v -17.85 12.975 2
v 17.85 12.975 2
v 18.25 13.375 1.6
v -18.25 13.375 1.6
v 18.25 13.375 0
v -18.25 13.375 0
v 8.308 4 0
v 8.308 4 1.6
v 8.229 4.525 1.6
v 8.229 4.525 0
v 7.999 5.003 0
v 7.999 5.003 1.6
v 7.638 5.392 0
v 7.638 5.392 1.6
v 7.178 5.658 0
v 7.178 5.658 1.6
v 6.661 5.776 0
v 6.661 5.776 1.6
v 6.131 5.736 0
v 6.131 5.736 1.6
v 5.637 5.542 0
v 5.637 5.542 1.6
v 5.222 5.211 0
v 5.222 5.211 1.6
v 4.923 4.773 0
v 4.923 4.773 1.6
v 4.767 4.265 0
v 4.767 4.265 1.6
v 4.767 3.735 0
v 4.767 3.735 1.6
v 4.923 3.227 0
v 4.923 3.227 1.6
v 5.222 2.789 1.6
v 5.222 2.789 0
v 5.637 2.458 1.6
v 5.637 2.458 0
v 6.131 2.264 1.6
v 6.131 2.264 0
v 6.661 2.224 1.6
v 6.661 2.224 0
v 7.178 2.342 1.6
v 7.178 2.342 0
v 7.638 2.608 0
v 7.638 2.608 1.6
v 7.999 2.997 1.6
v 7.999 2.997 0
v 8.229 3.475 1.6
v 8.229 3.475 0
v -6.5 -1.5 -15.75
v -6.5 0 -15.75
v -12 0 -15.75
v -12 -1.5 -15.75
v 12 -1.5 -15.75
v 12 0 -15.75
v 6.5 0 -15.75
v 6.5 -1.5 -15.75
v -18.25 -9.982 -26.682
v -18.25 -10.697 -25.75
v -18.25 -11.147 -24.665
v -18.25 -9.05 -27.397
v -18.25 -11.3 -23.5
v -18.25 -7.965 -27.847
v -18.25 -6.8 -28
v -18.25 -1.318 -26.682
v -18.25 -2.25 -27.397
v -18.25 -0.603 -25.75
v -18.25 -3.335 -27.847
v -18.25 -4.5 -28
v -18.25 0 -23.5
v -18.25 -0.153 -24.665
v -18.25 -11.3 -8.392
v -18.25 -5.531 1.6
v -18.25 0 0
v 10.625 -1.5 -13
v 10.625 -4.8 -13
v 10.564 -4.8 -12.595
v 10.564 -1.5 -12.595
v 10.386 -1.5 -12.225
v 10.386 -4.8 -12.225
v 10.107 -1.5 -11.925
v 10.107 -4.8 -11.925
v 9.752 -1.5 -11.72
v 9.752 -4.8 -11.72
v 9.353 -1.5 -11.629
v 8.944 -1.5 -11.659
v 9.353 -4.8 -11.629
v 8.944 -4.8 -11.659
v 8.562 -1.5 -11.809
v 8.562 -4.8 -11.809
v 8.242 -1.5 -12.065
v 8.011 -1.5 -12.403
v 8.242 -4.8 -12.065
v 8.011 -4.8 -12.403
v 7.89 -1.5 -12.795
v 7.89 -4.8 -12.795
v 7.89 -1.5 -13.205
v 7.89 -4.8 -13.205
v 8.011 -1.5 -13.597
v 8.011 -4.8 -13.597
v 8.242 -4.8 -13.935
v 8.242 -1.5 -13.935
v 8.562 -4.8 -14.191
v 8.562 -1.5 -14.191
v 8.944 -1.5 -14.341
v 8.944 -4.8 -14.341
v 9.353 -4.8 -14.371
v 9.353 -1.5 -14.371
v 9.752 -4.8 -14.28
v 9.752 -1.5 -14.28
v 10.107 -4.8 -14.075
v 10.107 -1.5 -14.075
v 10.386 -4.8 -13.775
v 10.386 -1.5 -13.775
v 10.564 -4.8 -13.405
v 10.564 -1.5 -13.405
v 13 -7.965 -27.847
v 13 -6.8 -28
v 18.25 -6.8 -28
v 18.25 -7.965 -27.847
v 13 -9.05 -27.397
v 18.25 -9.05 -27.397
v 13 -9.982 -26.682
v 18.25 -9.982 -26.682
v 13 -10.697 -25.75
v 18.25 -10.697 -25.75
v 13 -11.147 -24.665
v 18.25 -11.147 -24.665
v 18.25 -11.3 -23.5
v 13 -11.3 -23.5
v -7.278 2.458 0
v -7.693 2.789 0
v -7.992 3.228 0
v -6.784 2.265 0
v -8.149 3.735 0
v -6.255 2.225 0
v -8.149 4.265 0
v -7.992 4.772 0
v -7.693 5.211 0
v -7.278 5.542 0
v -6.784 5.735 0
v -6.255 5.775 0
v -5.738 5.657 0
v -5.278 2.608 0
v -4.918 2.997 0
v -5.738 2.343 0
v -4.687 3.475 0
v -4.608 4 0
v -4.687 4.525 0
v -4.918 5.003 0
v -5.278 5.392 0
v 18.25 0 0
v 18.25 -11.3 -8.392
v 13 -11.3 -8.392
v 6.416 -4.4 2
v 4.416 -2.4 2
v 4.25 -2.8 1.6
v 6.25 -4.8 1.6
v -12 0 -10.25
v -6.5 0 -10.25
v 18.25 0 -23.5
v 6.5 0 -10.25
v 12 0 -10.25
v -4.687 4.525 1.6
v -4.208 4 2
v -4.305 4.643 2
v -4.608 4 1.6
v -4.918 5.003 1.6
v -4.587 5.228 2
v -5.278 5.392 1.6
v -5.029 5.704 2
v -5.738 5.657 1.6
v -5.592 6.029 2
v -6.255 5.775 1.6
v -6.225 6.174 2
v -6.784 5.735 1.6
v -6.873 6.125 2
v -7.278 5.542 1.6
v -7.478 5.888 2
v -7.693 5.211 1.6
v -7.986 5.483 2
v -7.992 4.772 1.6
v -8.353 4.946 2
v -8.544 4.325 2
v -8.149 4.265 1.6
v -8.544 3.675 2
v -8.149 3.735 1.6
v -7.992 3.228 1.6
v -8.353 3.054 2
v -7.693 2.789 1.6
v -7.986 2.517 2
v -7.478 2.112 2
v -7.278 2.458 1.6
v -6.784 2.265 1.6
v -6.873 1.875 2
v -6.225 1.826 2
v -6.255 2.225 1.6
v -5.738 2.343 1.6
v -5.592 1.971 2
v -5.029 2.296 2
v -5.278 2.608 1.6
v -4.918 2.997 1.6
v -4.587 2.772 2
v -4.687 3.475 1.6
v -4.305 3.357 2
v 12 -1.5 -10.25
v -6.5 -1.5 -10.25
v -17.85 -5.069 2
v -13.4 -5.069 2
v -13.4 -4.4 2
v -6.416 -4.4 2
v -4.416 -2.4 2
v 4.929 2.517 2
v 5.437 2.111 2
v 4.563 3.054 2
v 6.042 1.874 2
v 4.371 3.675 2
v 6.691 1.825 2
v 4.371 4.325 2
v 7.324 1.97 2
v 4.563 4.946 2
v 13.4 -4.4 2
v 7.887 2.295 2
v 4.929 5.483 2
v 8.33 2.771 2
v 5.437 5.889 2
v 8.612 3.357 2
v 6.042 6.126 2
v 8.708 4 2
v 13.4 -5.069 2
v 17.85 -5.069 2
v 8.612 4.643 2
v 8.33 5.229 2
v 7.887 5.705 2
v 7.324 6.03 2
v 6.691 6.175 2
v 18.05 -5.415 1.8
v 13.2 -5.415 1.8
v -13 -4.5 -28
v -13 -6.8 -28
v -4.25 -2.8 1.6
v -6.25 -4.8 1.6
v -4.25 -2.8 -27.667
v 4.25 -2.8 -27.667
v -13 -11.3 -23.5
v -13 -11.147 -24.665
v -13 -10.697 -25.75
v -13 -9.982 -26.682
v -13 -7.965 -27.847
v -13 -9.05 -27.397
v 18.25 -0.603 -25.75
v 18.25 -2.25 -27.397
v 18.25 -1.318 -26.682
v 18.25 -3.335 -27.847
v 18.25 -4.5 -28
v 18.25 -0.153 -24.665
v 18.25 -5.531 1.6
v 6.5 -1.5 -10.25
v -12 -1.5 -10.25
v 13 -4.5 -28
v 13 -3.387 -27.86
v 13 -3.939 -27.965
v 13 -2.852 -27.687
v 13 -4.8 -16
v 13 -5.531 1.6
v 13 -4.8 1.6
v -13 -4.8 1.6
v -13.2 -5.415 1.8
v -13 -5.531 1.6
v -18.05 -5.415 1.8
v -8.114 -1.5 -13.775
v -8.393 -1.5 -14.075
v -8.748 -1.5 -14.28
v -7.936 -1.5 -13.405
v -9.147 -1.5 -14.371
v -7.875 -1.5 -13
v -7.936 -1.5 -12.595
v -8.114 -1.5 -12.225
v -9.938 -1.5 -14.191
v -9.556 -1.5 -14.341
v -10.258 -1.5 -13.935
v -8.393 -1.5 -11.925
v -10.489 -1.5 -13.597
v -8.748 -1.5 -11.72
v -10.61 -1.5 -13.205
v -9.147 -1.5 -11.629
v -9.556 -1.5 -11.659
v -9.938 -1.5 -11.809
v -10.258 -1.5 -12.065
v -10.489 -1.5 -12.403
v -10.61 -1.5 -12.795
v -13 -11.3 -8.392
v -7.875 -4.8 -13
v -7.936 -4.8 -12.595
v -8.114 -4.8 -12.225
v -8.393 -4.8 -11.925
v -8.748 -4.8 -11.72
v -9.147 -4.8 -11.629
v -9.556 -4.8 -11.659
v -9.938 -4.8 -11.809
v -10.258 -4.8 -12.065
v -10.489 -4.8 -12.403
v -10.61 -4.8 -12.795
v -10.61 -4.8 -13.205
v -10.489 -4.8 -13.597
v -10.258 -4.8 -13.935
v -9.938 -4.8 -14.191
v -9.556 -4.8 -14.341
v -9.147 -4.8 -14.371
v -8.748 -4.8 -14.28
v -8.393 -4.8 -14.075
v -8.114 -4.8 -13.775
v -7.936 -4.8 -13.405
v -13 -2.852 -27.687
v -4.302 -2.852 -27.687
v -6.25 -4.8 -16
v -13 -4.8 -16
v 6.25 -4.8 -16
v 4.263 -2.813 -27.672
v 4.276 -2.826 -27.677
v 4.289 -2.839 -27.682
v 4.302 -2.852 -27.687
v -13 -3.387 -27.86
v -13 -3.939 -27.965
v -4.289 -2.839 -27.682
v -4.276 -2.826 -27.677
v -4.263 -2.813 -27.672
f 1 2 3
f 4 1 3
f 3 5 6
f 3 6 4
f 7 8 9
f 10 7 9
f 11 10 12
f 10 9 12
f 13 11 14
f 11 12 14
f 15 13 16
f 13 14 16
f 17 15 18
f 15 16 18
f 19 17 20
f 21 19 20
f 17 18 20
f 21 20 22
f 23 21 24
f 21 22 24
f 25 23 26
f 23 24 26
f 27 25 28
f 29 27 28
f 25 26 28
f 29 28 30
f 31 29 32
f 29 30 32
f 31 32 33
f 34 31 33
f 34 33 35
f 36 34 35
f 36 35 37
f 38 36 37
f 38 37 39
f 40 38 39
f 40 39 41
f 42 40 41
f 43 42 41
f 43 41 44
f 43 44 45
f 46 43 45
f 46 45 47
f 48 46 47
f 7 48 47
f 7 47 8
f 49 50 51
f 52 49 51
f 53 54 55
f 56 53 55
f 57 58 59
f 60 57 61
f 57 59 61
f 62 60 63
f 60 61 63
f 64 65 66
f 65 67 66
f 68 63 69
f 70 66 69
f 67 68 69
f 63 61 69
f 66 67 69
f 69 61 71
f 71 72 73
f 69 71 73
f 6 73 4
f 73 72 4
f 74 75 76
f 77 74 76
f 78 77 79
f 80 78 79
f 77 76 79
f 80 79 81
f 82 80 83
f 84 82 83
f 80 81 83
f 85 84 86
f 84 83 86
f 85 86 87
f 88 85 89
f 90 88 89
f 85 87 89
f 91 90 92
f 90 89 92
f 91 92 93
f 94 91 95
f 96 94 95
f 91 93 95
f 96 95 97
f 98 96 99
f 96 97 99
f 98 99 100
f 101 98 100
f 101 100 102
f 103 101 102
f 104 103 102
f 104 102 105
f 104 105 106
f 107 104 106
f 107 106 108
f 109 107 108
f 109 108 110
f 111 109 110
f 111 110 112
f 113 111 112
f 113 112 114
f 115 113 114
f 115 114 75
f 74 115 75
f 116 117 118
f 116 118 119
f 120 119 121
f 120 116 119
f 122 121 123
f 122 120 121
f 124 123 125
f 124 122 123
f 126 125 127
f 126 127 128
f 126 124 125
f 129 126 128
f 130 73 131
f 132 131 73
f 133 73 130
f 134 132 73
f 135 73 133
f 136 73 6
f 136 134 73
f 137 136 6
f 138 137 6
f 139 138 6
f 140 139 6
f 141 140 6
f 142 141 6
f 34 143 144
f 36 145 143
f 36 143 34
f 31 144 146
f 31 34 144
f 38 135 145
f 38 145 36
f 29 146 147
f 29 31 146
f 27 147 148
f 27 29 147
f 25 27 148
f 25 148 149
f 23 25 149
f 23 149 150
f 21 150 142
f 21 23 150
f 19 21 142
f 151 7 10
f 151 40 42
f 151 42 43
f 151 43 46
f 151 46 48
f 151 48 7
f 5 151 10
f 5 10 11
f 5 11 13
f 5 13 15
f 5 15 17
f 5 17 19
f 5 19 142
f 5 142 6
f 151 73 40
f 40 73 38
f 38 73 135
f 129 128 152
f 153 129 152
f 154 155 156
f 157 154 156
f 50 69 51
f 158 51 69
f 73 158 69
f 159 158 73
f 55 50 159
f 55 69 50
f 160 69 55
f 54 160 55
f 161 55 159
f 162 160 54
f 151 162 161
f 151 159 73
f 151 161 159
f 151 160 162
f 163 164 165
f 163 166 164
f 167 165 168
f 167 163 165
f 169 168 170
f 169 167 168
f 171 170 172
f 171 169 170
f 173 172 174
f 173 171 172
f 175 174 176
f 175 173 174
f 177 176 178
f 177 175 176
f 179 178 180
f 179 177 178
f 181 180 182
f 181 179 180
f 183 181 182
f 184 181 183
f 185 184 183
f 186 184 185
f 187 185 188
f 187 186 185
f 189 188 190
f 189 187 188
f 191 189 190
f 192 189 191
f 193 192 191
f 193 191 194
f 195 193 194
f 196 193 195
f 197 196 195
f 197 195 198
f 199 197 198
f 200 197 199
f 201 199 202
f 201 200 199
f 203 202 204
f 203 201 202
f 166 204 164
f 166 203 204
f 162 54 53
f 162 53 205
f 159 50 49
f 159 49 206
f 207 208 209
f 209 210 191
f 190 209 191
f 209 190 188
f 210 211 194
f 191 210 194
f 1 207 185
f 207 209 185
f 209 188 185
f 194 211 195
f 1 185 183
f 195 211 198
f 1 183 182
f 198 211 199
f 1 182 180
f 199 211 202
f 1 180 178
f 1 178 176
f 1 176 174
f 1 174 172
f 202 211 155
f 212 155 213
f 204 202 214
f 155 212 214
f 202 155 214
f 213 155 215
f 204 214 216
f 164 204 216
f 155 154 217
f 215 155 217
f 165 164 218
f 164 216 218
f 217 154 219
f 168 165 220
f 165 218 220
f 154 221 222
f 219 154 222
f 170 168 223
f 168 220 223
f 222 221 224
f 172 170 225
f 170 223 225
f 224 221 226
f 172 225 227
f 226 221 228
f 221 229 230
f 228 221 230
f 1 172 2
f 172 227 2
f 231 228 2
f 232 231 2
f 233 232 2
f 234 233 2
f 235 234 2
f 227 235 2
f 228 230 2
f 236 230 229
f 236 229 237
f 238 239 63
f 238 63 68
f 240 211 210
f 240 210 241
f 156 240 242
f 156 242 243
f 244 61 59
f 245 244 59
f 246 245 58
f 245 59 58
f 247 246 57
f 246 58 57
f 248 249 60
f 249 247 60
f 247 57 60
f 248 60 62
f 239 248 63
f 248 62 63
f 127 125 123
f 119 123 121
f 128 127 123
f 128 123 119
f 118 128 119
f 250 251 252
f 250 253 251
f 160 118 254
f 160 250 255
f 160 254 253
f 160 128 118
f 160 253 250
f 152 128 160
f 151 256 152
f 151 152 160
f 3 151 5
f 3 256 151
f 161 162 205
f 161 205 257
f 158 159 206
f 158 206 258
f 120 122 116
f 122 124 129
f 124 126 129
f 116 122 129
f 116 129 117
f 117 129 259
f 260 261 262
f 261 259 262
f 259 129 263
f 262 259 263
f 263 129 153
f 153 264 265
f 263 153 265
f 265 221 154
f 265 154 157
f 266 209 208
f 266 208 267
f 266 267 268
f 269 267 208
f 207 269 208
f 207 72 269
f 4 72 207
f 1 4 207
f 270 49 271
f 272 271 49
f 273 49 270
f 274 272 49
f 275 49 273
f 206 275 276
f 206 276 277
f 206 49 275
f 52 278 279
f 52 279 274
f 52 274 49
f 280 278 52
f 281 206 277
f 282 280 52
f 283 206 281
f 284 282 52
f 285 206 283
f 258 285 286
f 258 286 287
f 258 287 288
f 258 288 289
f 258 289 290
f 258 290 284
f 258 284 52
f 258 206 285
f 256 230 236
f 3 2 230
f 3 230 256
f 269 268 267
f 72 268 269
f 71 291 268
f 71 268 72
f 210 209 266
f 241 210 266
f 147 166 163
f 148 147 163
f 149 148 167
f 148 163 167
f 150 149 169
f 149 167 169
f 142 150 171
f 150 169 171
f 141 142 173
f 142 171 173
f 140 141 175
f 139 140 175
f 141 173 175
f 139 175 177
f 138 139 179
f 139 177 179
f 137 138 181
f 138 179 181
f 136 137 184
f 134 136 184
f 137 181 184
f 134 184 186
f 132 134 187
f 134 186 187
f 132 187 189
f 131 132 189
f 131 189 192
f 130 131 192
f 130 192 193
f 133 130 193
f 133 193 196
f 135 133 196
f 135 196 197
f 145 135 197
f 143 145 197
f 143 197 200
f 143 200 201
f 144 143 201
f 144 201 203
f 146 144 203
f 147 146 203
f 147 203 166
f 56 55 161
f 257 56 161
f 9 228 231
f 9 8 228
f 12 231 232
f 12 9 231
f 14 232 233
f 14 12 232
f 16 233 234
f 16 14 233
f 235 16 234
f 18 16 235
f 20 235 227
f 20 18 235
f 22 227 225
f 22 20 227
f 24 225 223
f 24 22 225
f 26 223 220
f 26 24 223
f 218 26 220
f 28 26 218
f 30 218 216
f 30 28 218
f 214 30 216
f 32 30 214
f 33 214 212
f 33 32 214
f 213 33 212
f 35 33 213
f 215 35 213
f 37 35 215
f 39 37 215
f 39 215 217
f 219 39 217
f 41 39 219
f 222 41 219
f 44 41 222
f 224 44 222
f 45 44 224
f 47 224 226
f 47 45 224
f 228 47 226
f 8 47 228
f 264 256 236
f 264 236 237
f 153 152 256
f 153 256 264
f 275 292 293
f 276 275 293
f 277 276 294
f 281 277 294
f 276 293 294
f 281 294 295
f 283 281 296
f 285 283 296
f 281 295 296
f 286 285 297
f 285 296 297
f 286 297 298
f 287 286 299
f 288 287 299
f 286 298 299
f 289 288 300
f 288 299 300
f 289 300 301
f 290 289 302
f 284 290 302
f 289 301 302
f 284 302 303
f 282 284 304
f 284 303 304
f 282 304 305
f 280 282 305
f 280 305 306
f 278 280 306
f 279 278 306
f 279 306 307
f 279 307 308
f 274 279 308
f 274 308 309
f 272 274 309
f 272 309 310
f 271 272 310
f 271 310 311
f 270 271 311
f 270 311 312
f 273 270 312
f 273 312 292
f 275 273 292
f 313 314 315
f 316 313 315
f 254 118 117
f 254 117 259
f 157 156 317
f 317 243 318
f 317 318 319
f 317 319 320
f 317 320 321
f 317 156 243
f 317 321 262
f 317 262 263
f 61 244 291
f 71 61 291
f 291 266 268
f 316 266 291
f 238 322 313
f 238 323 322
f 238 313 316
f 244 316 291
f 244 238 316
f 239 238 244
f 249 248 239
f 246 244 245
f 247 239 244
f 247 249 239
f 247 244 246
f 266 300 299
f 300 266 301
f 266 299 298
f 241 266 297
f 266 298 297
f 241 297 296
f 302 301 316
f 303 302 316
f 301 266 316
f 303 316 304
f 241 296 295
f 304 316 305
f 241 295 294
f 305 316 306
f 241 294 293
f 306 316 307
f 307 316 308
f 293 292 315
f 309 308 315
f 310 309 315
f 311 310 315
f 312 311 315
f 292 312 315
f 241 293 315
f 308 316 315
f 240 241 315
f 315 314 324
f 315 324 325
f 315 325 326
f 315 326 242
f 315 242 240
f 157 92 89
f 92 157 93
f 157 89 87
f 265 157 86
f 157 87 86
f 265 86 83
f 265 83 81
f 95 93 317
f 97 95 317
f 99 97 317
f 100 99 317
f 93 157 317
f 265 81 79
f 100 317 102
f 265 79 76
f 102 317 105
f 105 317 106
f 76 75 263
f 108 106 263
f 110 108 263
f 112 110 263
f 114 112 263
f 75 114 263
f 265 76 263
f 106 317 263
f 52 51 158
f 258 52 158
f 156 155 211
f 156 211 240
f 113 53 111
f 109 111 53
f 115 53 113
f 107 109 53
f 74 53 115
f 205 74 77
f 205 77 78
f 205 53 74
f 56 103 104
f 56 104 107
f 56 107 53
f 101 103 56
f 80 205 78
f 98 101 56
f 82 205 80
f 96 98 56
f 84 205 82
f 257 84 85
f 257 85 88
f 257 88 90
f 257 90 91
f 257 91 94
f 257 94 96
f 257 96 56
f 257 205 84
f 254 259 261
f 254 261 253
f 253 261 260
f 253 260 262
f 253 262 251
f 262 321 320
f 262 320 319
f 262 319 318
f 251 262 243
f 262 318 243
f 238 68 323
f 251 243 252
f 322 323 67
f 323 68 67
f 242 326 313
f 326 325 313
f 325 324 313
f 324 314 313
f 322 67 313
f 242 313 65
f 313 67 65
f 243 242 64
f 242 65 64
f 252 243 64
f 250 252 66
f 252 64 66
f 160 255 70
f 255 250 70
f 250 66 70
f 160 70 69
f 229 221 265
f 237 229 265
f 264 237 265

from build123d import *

# Parameters (mm, degrees)
F0_W           = 13.375
F0_H           = 2
F1_DEPTH       = 18.25
F2_R           = 1.7808687455
F2_R_2         = 1.7800904517
F3_DEPTH       = 2
F4_W           = 11.3
F4_H           = 30
F5_DEPTH       = 18.25
F6_W           = 26
F6_H           = 6.5
F7_DEPTH       = 30
F9_DEPTH       = 30
F11_DEPTH      = 13
F11_DEPTH_BACK = 13
F12_R          = 1.375
F13_DEPTH      = 4.8
F14_W          = 5.5
F14_H          = 5.5
F15_DEPTH      = 1.5
F16_T1_DEPTH   = 27.75
F16_T3_DEPTH   = 27.75
F16_T5_DEPTH   = 59
F17_SIZE2      = 10.3923048454
F17_SIZE       = 6
F18_T1_DEPTH   = 20.7323463904
F18_T3_DEPTH   = 6.4746360003
F18_T5_DEPTH   = 38.5573463904
F18_T7_DEPTH   = 1.5286731952
F18_T9_DEPTH   = 7.7786731952
F18_T11_DEPTH  = 6.4746360003
F18_T13_DEPTH  = 7.7786731952
F18_T18_DEPTH  = 4.8857735151
F18_T23_DEPTH  = 10.5573463904
F18_T29_DEPTH  = 4.8857735151
F18_T39_DEPTH  = 2.5573463904
F18_T43_DEPTH  = 8.8073463904
F18_T50_DEPTH  = 4.8857735151
F18_T54_DEPTH  = 10.5573463904
F18_T61_DEPTH  = 2.5573463904
F18_T65_DEPTH  = 8.8073463904
F18_T72_DEPTH  = 10.5573463904
F18_T76_DEPTH  = 4.8857735151


# Not quite as in the source:
# - a fillet or chamfer that OpenCascade refuses, or shapes differently, is made with other operations: its cross-section is extruded or revolved along the edge and cut away or added


with BuildPart() as f1:
    # F0 (on Right) → F1 (new body, symmetric)
    with BuildSketch(Plane.YZ):
        with Locations((6.6875, 1)):
            Rectangle(F0_W, F0_H)
    extrude(amount=F1_DEPTH, both=True)

    # F2 (on face) → F3 (cut, through all)
    with BuildSketch(Plane.XY.offset(2)):
        with Locations((6.5276143141, 4)):
            Circle(F2_R)
        with Locations((-6.3883271068, 4)):
            Circle(F2_R_2)
    extrude(amount=-F3_DEPTH, mode=Mode.SUBTRACT)

    # F4 (on Right) → F5 (join, symmetric)
    with BuildSketch(Plane.YZ):
        with Locations((-5.65, -13)):
            Rectangle(F4_W, F4_H)
    extrude(amount=F5_DEPTH, both=True)

    # F6 (on face) → F7 (cut, through all)
    with BuildSketch(Plane(origin=(0, 0, -28), x_dir=(1, 0, 0), z_dir=(0, 0, -1))):
        with Locations((0, 8.05)):
            Rectangle(F6_W, F6_H)
    extrude(amount=-F7_DEPTH, mode=Mode.SUBTRACT)

    # F8 (on face) → F9 (cut, through all)
    with BuildSketch(Plane(origin=(0, 0, -28), x_dir=(1, 0, 0), z_dir=(0, 0, -1))):
        Polygon((6.25, 4.8), (-6.25, 4.8), (-4.25, 2.8), (4.25, 2.8), align=None)
    extrude(amount=-F9_DEPTH, mode=Mode.SUBTRACT)

    # F10 (on Right) → F11 (cut, two sides)
    with BuildSketch(Plane.YZ) as f11_sk:
        Polygon((-4.8, -28), (-2.8, -28), (-4.8, -16), align=None)
    extrude(amount=F11_DEPTH, mode=Mode.SUBTRACT)
    extrude(f11_sk.sketch, amount=-F11_DEPTH_BACK, mode=Mode.SUBTRACT)

    # F12 (on face) → F13 (cut, through all)
    with BuildSketch(Plane.XZ.offset(4.8)):
        with Locations((-9.25, -13)):
            Circle(F12_R)
        with Locations((9.25, -13)):
            Circle(F12_R)
    extrude(amount=-F13_DEPTH, mode=Mode.SUBTRACT)

    # F14 (on face) → F15 (cut)
    with BuildSketch(Plane(origin=(0, 0, 0), x_dir=(-1, 0, 0), z_dir=(0, 1, 0))):
        with Locations((-9.25, -13)):
            Rectangle(F14_W, F14_H)
        with Locations((9.25, -13)):
            Rectangle(F14_W, F14_H)
    extrude(amount=-F15_DEPTH, mode=Mode.SUBTRACT)

    # F16: fillet of radius 4.5 on 3 edges, made by hand

    # F16_s2 → F16_t1 (cut)
    with BuildSketch(Plane.YZ.offset(-29.5)):
        with BuildLine():
            ThreePointArc((-11.3, -23.5), (-9.9819805153, -26.6819805153), (-6.8, -28))
            Line((-6.8, -28), (-11.3, -28))
            Line((-11.3, -28), (-11.3, -23.5))
        make_face()
    extrude(amount=F16_T1_DEPTH, mode=Mode.SUBTRACT)

    # F16_s4 → F16_t3 (cut)
    with BuildSketch(Plane.YZ.offset(1.75)):
        with BuildLine():
            ThreePointArc((-6.8, -28), (-9.9819805153, -26.6819805153), (-11.3, -23.5))
            Line((-11.3, -23.5), (-11.3, -28))
            Line((-11.3, -28), (-6.8, -28))
        make_face()
    extrude(amount=F16_T3_DEPTH, mode=Mode.SUBTRACT)

    # F16_s6 → F16_t5 (cut)
    with BuildSketch(Plane.YZ.offset(-29.5)):
        with BuildLine():
            ThreePointArc((-4.5, -28), (-1.3180194847, -26.6819805153), (0, -23.5))
            Line((0, -23.5), (0, -28))
            Line((0, -28), (-4.5, -28))
        make_face()
    extrude(amount=F16_T5_DEPTH, mode=Mode.SUBTRACT)

    # F17
    f17_edges = [f1.edges().sort_by_distance(p)[0] for p in [
        (-15.625, -11.3, 2),
        (15.625, -11.3, 2),
    ]]
    f17_side = f1.faces().sort_by_distance((-0.00209, 3.324537, 2))[0]
    chamfer(f17_edges, length=F17_SIZE, length2=F17_SIZE2, reference=f17_side)

    # F18: chamfer of 0.4 on 14 edges, made by hand

    # F18_s2 → F18_t1 (cut)
    with BuildSketch(Plane.XZ.offset(-14.4036731952)):
        Polygon((-18.25, 1.6), (-17.85, 2), (-18.25, 2), align=None)
        Polygon((17.85, 2), (18.25, 1.6), (18.25, 2), align=None)
    extrude(amount=F18_T1_DEPTH, mode=Mode.SUBTRACT)

    # F18_s4 → F18_t3 (cut)
    with BuildSketch(Plane.YZ.offset(-18.8623180002)):
        Polygon((-5.4154700538, 1.8), (-5.0690598923, 2), (-5.3, 2), align=None)
    extrude(amount=F18_T3_DEPTH, mode=Mode.SUBTRACT)

    # F18_s6 → F18_t5 (cut)
    with BuildSketch(Plane.YZ.offset(-19.2786731952)):
        Polygon((12.975, 2), (13.375, 1.6), (13.375, 2), align=None)
    extrude(amount=F18_T5_DEPTH, mode=Mode.SUBTRACT)

    # F18_s8 → F18_t7 (cut)
    with BuildSketch(Plane.XZ.offset(4.8)):
        Polygon((-13.4, 2), (-13, 1.6), (-13, 2), align=None)
        Polygon((13.4, 2), (13, 1.6), (13, 2), align=None)
    extrude(amount=F18_T7_DEPTH, mode=Mode.SUBTRACT)

    # F18_s10 → F18_t9 (cut)
    with BuildSketch(Plane.YZ.offset(-13)):
        Polygon((-4.4, 2), (-4.8, 1.6), (-4.8, 2), align=None)
    extrude(amount=F18_T9_DEPTH, mode=Mode.SUBTRACT)

    # F18_s12 → F18_t11 (cut)
    with BuildSketch(Plane.YZ.offset(12.3876819998)):
        Polygon((-5.0690598923, 2), (-5.4154700538, 1.8), (-5.3, 2), align=None)
    extrude(amount=F18_T11_DEPTH, mode=Mode.SUBTRACT)

    # F18_s14 → F18_t13 (cut)
    with BuildSketch(Plane.YZ.offset(5.2213268048)):
        Polygon((-4.4, 2), (-4.8, 1.6), (-4.8, 2), align=None)
    extrude(amount=F18_T13_DEPTH, mode=Mode.SUBTRACT)


with BuildPart() as f18_tool16:
    # F18_s17 → F18_t18 (new body)
    with BuildSketch(Plane(origin=(-6.2523817919, -6.2523817919, 0), x_dir=(0, 0, 1), z_dir=(0.7071067812, 0.7071067812, 0))):
        Polygon((2, -1.4253048327), (1.6, -1.0253048327), (2, -1.0253048327), align=None)
    extrude(amount=F18_T18_DEPTH)

    split(bisect_by=Plane.XZ.offset(2.8), keep=Keep.TOP)


with BuildPart() as f1_1:
    add(f1.part)

    # F18_t15: cut F18_tool16
    add(f18_tool16.part, mode=Mode.SUBTRACT)


with BuildPart() as f18_tool21:
    # F18_s22 → F18_t23 (new body)
    with BuildSketch(Plane.YZ.offset(-5.2786731952)):
        Polygon((-2.4, 2), (-2.8, 1.6), (-2.8, 2), align=None)
    extrude(amount=F18_T23_DEPTH)

    split(bisect_by=Plane(origin=(-0.725, 0.725, 0), x_dir=(0, 0, 1), z_dir=(0.7071067812, -0.7071067812, 0)), keep=Keep.TOP)

    split(bisect_by=Plane(origin=(0.725, 0.725, 0), x_dir=(0, 0, 1), z_dir=(-0.7071067812, -0.7071067812, 0)), keep=Keep.TOP)


with BuildPart() as f1_2:
    add(f1_1.part)

    # F18_t20: cut F18_tool21
    add(f18_tool21.part, mode=Mode.SUBTRACT)


with BuildPart() as f18_tool27:
    # F18_s28 → F18_t29 (new body)
    with BuildSketch(Plane(origin=(2.7976182081, -2.7976182081, 0), x_dir=(0, 0, 1), z_dir=(0.7071067812, -0.7071067812, 0))):
        Polygon((2, -1.4253048327), (1.6, -1.0253048327), (2, -1.0253048327), align=None)
    extrude(amount=F18_T29_DEPTH)

    split(bisect_by=Plane.XZ.offset(2.8), keep=Keep.TOP)


with BuildPart() as f1_3:
    add(f1_2.part)

    # F18_t26: cut F18_tool27
    add(f18_tool27.part, mode=Mode.SUBTRACT)

    # F18_s31 → F18_t32 (revolve, cut)
    with BuildSketch(Plane.XZ.offset(-4)):
        Polygon((-4.2082366551, 2), (-4.6082366551, 1.6), (-4.6082366551, 2), align=None)
    revolve(axis=Axis((-6.3883271068, 4, 2), (0, 0, 1)), mode=Mode.SUBTRACT)

    # F18_s33 → F18_t34 (revolve, cut)
    with BuildSketch(Plane.XZ.offset(-4)):
        Polygon((8.7084830596, 2), (8.3084830596, 1.6), (8.3084830596, 2), align=None)
    revolve(axis=Axis((6.5276143141, 4, 2), (0, 0, 1)), mode=Mode.SUBTRACT)


with BuildPart() as f18_tool37:
    # F18_s38 → F18_t39 (new body)
    with BuildSketch(Plane.XZ.offset(6.3286731952)):
        Polygon((-13.4, 2), (-13, 1.6), (-13, 2), align=None)
    extrude(amount=-F18_T39_DEPTH)

    split(bisect_by=Plane.XZ.offset(4.8), keep=Keep.BOTTOM)


with BuildPart() as f18_tool41:
    # F18_s42 → F18_t43 (new body)
    with BuildSketch(Plane.YZ.offset(-14.0286731952)):
        Polygon((-4.4, 2), (-4.8, 1.6), (-4.8, 2), align=None)
    extrude(amount=F18_T43_DEPTH)

    split(bisect_by=Plane.YZ.offset(-13), keep=Keep.BOTTOM)


with BuildPart() as f18_tool37_1:
    add(f18_tool37.part)

    # F18_t45: intersect F18_tool41
    add(f18_tool41.part, mode=Mode.INTERSECT)


with BuildPart() as f1_4:
    add(f1_3.part)

    # F18_t35: cut F18_tool37
    add(f18_tool37_1.part, mode=Mode.SUBTRACT)


with BuildPart() as f18_tool48:
    # F18_s49 → F18_t50 (new body)
    with BuildSketch(Plane(origin=(-6.2523817919, -6.2523817919, 0), x_dir=(0, 0, 1), z_dir=(0.7071067812, 0.7071067812, 0))):
        Polygon((2, -1.4253048327), (1.6, -1.0253048327), (2, -1.0253048327), align=None)
    extrude(amount=F18_T50_DEPTH)

    split(bisect_by=Plane.XZ.offset(2.8), keep=Keep.BOTTOM)


with BuildPart() as f18_tool52:
    # F18_s53 → F18_t54 (new body)
    with BuildSketch(Plane.YZ.offset(-5.2786731952)):
        Polygon((-2.4, 2), (-2.8, 1.6), (-2.8, 2), align=None)
    extrude(amount=F18_T54_DEPTH)

    split(bisect_by=Plane(origin=(-0.725, 0.725, 0), x_dir=(0, 0, 1), z_dir=(-0.7071067812, 0.7071067812, 0)), keep=Keep.TOP)


with BuildPart() as f18_tool48_1:
    add(f18_tool48.part)

    # F18_t56: intersect F18_tool52
    add(f18_tool52.part, mode=Mode.INTERSECT)


with BuildPart() as f1_5:
    add(f1_4.part)

    # F18_t46: cut F18_tool48
    add(f18_tool48_1.part, mode=Mode.SUBTRACT)


with BuildPart() as f18_tool59:
    # F18_s60 → F18_t61 (new body)
    with BuildSketch(Plane.XZ.offset(3.7713268048)):
        Polygon((13.4, 2), (13, 1.6), (13, 2), align=None)
    extrude(amount=F18_T61_DEPTH)

    split(bisect_by=Plane.XZ.offset(4.8), keep=Keep.BOTTOM)


with BuildPart() as f18_tool63:
    # F18_s64 → F18_t65 (new body)
    with BuildSketch(Plane.YZ.offset(5.2213268048)):
        Polygon((-4.4, 2), (-4.8, 1.6), (-4.8, 2), align=None)
    extrude(amount=F18_T65_DEPTH)

    split(bisect_by=Plane.YZ.offset(13), keep=Keep.TOP)


with BuildPart() as f18_tool59_1:
    add(f18_tool59.part)

    # F18_t67: intersect F18_tool63
    add(f18_tool63.part, mode=Mode.INTERSECT)


with BuildPart() as f1_6:
    add(f1_5.part)

    # F18_t57: cut F18_tool59
    add(f18_tool59_1.part, mode=Mode.SUBTRACT)


with BuildPart() as f18_tool70:
    # F18_s71 → F18_t72 (new body)
    with BuildSketch(Plane.YZ.offset(-5.2786731952)):
        Polygon((-2.4, 2), (-2.8, 1.6), (-2.8, 2), align=None)
    extrude(amount=F18_T72_DEPTH)

    split(bisect_by=Plane(origin=(0.725, 0.725, 0), x_dir=(0, 0, 1), z_dir=(0.7071067812, 0.7071067812, 0)), keep=Keep.TOP)


with BuildPart() as f18_tool74:
    # F18_s75 → F18_t76 (new body)
    with BuildSketch(Plane(origin=(2.7976182081, -2.7976182081, 0), x_dir=(0, 0, 1), z_dir=(0.7071067812, -0.7071067812, 0))):
        Polygon((2, -1.4253048327), (1.6, -1.0253048327), (2, -1.0253048327), align=None)
    extrude(amount=F18_T76_DEPTH)

    split(bisect_by=Plane.XZ.offset(2.8), keep=Keep.BOTTOM)


with BuildPart() as f18_tool70_1:
    add(f18_tool70.part)

    # F18_t78: intersect F18_tool74
    add(f18_tool74.part, mode=Mode.INTERSECT)


with BuildPart() as f1_7:
    add(f1_6.part)

    # F18_t68: cut F18_tool70
    add(f18_tool70_1.part, mode=Mode.SUBTRACT)


solid = f1_7.part
